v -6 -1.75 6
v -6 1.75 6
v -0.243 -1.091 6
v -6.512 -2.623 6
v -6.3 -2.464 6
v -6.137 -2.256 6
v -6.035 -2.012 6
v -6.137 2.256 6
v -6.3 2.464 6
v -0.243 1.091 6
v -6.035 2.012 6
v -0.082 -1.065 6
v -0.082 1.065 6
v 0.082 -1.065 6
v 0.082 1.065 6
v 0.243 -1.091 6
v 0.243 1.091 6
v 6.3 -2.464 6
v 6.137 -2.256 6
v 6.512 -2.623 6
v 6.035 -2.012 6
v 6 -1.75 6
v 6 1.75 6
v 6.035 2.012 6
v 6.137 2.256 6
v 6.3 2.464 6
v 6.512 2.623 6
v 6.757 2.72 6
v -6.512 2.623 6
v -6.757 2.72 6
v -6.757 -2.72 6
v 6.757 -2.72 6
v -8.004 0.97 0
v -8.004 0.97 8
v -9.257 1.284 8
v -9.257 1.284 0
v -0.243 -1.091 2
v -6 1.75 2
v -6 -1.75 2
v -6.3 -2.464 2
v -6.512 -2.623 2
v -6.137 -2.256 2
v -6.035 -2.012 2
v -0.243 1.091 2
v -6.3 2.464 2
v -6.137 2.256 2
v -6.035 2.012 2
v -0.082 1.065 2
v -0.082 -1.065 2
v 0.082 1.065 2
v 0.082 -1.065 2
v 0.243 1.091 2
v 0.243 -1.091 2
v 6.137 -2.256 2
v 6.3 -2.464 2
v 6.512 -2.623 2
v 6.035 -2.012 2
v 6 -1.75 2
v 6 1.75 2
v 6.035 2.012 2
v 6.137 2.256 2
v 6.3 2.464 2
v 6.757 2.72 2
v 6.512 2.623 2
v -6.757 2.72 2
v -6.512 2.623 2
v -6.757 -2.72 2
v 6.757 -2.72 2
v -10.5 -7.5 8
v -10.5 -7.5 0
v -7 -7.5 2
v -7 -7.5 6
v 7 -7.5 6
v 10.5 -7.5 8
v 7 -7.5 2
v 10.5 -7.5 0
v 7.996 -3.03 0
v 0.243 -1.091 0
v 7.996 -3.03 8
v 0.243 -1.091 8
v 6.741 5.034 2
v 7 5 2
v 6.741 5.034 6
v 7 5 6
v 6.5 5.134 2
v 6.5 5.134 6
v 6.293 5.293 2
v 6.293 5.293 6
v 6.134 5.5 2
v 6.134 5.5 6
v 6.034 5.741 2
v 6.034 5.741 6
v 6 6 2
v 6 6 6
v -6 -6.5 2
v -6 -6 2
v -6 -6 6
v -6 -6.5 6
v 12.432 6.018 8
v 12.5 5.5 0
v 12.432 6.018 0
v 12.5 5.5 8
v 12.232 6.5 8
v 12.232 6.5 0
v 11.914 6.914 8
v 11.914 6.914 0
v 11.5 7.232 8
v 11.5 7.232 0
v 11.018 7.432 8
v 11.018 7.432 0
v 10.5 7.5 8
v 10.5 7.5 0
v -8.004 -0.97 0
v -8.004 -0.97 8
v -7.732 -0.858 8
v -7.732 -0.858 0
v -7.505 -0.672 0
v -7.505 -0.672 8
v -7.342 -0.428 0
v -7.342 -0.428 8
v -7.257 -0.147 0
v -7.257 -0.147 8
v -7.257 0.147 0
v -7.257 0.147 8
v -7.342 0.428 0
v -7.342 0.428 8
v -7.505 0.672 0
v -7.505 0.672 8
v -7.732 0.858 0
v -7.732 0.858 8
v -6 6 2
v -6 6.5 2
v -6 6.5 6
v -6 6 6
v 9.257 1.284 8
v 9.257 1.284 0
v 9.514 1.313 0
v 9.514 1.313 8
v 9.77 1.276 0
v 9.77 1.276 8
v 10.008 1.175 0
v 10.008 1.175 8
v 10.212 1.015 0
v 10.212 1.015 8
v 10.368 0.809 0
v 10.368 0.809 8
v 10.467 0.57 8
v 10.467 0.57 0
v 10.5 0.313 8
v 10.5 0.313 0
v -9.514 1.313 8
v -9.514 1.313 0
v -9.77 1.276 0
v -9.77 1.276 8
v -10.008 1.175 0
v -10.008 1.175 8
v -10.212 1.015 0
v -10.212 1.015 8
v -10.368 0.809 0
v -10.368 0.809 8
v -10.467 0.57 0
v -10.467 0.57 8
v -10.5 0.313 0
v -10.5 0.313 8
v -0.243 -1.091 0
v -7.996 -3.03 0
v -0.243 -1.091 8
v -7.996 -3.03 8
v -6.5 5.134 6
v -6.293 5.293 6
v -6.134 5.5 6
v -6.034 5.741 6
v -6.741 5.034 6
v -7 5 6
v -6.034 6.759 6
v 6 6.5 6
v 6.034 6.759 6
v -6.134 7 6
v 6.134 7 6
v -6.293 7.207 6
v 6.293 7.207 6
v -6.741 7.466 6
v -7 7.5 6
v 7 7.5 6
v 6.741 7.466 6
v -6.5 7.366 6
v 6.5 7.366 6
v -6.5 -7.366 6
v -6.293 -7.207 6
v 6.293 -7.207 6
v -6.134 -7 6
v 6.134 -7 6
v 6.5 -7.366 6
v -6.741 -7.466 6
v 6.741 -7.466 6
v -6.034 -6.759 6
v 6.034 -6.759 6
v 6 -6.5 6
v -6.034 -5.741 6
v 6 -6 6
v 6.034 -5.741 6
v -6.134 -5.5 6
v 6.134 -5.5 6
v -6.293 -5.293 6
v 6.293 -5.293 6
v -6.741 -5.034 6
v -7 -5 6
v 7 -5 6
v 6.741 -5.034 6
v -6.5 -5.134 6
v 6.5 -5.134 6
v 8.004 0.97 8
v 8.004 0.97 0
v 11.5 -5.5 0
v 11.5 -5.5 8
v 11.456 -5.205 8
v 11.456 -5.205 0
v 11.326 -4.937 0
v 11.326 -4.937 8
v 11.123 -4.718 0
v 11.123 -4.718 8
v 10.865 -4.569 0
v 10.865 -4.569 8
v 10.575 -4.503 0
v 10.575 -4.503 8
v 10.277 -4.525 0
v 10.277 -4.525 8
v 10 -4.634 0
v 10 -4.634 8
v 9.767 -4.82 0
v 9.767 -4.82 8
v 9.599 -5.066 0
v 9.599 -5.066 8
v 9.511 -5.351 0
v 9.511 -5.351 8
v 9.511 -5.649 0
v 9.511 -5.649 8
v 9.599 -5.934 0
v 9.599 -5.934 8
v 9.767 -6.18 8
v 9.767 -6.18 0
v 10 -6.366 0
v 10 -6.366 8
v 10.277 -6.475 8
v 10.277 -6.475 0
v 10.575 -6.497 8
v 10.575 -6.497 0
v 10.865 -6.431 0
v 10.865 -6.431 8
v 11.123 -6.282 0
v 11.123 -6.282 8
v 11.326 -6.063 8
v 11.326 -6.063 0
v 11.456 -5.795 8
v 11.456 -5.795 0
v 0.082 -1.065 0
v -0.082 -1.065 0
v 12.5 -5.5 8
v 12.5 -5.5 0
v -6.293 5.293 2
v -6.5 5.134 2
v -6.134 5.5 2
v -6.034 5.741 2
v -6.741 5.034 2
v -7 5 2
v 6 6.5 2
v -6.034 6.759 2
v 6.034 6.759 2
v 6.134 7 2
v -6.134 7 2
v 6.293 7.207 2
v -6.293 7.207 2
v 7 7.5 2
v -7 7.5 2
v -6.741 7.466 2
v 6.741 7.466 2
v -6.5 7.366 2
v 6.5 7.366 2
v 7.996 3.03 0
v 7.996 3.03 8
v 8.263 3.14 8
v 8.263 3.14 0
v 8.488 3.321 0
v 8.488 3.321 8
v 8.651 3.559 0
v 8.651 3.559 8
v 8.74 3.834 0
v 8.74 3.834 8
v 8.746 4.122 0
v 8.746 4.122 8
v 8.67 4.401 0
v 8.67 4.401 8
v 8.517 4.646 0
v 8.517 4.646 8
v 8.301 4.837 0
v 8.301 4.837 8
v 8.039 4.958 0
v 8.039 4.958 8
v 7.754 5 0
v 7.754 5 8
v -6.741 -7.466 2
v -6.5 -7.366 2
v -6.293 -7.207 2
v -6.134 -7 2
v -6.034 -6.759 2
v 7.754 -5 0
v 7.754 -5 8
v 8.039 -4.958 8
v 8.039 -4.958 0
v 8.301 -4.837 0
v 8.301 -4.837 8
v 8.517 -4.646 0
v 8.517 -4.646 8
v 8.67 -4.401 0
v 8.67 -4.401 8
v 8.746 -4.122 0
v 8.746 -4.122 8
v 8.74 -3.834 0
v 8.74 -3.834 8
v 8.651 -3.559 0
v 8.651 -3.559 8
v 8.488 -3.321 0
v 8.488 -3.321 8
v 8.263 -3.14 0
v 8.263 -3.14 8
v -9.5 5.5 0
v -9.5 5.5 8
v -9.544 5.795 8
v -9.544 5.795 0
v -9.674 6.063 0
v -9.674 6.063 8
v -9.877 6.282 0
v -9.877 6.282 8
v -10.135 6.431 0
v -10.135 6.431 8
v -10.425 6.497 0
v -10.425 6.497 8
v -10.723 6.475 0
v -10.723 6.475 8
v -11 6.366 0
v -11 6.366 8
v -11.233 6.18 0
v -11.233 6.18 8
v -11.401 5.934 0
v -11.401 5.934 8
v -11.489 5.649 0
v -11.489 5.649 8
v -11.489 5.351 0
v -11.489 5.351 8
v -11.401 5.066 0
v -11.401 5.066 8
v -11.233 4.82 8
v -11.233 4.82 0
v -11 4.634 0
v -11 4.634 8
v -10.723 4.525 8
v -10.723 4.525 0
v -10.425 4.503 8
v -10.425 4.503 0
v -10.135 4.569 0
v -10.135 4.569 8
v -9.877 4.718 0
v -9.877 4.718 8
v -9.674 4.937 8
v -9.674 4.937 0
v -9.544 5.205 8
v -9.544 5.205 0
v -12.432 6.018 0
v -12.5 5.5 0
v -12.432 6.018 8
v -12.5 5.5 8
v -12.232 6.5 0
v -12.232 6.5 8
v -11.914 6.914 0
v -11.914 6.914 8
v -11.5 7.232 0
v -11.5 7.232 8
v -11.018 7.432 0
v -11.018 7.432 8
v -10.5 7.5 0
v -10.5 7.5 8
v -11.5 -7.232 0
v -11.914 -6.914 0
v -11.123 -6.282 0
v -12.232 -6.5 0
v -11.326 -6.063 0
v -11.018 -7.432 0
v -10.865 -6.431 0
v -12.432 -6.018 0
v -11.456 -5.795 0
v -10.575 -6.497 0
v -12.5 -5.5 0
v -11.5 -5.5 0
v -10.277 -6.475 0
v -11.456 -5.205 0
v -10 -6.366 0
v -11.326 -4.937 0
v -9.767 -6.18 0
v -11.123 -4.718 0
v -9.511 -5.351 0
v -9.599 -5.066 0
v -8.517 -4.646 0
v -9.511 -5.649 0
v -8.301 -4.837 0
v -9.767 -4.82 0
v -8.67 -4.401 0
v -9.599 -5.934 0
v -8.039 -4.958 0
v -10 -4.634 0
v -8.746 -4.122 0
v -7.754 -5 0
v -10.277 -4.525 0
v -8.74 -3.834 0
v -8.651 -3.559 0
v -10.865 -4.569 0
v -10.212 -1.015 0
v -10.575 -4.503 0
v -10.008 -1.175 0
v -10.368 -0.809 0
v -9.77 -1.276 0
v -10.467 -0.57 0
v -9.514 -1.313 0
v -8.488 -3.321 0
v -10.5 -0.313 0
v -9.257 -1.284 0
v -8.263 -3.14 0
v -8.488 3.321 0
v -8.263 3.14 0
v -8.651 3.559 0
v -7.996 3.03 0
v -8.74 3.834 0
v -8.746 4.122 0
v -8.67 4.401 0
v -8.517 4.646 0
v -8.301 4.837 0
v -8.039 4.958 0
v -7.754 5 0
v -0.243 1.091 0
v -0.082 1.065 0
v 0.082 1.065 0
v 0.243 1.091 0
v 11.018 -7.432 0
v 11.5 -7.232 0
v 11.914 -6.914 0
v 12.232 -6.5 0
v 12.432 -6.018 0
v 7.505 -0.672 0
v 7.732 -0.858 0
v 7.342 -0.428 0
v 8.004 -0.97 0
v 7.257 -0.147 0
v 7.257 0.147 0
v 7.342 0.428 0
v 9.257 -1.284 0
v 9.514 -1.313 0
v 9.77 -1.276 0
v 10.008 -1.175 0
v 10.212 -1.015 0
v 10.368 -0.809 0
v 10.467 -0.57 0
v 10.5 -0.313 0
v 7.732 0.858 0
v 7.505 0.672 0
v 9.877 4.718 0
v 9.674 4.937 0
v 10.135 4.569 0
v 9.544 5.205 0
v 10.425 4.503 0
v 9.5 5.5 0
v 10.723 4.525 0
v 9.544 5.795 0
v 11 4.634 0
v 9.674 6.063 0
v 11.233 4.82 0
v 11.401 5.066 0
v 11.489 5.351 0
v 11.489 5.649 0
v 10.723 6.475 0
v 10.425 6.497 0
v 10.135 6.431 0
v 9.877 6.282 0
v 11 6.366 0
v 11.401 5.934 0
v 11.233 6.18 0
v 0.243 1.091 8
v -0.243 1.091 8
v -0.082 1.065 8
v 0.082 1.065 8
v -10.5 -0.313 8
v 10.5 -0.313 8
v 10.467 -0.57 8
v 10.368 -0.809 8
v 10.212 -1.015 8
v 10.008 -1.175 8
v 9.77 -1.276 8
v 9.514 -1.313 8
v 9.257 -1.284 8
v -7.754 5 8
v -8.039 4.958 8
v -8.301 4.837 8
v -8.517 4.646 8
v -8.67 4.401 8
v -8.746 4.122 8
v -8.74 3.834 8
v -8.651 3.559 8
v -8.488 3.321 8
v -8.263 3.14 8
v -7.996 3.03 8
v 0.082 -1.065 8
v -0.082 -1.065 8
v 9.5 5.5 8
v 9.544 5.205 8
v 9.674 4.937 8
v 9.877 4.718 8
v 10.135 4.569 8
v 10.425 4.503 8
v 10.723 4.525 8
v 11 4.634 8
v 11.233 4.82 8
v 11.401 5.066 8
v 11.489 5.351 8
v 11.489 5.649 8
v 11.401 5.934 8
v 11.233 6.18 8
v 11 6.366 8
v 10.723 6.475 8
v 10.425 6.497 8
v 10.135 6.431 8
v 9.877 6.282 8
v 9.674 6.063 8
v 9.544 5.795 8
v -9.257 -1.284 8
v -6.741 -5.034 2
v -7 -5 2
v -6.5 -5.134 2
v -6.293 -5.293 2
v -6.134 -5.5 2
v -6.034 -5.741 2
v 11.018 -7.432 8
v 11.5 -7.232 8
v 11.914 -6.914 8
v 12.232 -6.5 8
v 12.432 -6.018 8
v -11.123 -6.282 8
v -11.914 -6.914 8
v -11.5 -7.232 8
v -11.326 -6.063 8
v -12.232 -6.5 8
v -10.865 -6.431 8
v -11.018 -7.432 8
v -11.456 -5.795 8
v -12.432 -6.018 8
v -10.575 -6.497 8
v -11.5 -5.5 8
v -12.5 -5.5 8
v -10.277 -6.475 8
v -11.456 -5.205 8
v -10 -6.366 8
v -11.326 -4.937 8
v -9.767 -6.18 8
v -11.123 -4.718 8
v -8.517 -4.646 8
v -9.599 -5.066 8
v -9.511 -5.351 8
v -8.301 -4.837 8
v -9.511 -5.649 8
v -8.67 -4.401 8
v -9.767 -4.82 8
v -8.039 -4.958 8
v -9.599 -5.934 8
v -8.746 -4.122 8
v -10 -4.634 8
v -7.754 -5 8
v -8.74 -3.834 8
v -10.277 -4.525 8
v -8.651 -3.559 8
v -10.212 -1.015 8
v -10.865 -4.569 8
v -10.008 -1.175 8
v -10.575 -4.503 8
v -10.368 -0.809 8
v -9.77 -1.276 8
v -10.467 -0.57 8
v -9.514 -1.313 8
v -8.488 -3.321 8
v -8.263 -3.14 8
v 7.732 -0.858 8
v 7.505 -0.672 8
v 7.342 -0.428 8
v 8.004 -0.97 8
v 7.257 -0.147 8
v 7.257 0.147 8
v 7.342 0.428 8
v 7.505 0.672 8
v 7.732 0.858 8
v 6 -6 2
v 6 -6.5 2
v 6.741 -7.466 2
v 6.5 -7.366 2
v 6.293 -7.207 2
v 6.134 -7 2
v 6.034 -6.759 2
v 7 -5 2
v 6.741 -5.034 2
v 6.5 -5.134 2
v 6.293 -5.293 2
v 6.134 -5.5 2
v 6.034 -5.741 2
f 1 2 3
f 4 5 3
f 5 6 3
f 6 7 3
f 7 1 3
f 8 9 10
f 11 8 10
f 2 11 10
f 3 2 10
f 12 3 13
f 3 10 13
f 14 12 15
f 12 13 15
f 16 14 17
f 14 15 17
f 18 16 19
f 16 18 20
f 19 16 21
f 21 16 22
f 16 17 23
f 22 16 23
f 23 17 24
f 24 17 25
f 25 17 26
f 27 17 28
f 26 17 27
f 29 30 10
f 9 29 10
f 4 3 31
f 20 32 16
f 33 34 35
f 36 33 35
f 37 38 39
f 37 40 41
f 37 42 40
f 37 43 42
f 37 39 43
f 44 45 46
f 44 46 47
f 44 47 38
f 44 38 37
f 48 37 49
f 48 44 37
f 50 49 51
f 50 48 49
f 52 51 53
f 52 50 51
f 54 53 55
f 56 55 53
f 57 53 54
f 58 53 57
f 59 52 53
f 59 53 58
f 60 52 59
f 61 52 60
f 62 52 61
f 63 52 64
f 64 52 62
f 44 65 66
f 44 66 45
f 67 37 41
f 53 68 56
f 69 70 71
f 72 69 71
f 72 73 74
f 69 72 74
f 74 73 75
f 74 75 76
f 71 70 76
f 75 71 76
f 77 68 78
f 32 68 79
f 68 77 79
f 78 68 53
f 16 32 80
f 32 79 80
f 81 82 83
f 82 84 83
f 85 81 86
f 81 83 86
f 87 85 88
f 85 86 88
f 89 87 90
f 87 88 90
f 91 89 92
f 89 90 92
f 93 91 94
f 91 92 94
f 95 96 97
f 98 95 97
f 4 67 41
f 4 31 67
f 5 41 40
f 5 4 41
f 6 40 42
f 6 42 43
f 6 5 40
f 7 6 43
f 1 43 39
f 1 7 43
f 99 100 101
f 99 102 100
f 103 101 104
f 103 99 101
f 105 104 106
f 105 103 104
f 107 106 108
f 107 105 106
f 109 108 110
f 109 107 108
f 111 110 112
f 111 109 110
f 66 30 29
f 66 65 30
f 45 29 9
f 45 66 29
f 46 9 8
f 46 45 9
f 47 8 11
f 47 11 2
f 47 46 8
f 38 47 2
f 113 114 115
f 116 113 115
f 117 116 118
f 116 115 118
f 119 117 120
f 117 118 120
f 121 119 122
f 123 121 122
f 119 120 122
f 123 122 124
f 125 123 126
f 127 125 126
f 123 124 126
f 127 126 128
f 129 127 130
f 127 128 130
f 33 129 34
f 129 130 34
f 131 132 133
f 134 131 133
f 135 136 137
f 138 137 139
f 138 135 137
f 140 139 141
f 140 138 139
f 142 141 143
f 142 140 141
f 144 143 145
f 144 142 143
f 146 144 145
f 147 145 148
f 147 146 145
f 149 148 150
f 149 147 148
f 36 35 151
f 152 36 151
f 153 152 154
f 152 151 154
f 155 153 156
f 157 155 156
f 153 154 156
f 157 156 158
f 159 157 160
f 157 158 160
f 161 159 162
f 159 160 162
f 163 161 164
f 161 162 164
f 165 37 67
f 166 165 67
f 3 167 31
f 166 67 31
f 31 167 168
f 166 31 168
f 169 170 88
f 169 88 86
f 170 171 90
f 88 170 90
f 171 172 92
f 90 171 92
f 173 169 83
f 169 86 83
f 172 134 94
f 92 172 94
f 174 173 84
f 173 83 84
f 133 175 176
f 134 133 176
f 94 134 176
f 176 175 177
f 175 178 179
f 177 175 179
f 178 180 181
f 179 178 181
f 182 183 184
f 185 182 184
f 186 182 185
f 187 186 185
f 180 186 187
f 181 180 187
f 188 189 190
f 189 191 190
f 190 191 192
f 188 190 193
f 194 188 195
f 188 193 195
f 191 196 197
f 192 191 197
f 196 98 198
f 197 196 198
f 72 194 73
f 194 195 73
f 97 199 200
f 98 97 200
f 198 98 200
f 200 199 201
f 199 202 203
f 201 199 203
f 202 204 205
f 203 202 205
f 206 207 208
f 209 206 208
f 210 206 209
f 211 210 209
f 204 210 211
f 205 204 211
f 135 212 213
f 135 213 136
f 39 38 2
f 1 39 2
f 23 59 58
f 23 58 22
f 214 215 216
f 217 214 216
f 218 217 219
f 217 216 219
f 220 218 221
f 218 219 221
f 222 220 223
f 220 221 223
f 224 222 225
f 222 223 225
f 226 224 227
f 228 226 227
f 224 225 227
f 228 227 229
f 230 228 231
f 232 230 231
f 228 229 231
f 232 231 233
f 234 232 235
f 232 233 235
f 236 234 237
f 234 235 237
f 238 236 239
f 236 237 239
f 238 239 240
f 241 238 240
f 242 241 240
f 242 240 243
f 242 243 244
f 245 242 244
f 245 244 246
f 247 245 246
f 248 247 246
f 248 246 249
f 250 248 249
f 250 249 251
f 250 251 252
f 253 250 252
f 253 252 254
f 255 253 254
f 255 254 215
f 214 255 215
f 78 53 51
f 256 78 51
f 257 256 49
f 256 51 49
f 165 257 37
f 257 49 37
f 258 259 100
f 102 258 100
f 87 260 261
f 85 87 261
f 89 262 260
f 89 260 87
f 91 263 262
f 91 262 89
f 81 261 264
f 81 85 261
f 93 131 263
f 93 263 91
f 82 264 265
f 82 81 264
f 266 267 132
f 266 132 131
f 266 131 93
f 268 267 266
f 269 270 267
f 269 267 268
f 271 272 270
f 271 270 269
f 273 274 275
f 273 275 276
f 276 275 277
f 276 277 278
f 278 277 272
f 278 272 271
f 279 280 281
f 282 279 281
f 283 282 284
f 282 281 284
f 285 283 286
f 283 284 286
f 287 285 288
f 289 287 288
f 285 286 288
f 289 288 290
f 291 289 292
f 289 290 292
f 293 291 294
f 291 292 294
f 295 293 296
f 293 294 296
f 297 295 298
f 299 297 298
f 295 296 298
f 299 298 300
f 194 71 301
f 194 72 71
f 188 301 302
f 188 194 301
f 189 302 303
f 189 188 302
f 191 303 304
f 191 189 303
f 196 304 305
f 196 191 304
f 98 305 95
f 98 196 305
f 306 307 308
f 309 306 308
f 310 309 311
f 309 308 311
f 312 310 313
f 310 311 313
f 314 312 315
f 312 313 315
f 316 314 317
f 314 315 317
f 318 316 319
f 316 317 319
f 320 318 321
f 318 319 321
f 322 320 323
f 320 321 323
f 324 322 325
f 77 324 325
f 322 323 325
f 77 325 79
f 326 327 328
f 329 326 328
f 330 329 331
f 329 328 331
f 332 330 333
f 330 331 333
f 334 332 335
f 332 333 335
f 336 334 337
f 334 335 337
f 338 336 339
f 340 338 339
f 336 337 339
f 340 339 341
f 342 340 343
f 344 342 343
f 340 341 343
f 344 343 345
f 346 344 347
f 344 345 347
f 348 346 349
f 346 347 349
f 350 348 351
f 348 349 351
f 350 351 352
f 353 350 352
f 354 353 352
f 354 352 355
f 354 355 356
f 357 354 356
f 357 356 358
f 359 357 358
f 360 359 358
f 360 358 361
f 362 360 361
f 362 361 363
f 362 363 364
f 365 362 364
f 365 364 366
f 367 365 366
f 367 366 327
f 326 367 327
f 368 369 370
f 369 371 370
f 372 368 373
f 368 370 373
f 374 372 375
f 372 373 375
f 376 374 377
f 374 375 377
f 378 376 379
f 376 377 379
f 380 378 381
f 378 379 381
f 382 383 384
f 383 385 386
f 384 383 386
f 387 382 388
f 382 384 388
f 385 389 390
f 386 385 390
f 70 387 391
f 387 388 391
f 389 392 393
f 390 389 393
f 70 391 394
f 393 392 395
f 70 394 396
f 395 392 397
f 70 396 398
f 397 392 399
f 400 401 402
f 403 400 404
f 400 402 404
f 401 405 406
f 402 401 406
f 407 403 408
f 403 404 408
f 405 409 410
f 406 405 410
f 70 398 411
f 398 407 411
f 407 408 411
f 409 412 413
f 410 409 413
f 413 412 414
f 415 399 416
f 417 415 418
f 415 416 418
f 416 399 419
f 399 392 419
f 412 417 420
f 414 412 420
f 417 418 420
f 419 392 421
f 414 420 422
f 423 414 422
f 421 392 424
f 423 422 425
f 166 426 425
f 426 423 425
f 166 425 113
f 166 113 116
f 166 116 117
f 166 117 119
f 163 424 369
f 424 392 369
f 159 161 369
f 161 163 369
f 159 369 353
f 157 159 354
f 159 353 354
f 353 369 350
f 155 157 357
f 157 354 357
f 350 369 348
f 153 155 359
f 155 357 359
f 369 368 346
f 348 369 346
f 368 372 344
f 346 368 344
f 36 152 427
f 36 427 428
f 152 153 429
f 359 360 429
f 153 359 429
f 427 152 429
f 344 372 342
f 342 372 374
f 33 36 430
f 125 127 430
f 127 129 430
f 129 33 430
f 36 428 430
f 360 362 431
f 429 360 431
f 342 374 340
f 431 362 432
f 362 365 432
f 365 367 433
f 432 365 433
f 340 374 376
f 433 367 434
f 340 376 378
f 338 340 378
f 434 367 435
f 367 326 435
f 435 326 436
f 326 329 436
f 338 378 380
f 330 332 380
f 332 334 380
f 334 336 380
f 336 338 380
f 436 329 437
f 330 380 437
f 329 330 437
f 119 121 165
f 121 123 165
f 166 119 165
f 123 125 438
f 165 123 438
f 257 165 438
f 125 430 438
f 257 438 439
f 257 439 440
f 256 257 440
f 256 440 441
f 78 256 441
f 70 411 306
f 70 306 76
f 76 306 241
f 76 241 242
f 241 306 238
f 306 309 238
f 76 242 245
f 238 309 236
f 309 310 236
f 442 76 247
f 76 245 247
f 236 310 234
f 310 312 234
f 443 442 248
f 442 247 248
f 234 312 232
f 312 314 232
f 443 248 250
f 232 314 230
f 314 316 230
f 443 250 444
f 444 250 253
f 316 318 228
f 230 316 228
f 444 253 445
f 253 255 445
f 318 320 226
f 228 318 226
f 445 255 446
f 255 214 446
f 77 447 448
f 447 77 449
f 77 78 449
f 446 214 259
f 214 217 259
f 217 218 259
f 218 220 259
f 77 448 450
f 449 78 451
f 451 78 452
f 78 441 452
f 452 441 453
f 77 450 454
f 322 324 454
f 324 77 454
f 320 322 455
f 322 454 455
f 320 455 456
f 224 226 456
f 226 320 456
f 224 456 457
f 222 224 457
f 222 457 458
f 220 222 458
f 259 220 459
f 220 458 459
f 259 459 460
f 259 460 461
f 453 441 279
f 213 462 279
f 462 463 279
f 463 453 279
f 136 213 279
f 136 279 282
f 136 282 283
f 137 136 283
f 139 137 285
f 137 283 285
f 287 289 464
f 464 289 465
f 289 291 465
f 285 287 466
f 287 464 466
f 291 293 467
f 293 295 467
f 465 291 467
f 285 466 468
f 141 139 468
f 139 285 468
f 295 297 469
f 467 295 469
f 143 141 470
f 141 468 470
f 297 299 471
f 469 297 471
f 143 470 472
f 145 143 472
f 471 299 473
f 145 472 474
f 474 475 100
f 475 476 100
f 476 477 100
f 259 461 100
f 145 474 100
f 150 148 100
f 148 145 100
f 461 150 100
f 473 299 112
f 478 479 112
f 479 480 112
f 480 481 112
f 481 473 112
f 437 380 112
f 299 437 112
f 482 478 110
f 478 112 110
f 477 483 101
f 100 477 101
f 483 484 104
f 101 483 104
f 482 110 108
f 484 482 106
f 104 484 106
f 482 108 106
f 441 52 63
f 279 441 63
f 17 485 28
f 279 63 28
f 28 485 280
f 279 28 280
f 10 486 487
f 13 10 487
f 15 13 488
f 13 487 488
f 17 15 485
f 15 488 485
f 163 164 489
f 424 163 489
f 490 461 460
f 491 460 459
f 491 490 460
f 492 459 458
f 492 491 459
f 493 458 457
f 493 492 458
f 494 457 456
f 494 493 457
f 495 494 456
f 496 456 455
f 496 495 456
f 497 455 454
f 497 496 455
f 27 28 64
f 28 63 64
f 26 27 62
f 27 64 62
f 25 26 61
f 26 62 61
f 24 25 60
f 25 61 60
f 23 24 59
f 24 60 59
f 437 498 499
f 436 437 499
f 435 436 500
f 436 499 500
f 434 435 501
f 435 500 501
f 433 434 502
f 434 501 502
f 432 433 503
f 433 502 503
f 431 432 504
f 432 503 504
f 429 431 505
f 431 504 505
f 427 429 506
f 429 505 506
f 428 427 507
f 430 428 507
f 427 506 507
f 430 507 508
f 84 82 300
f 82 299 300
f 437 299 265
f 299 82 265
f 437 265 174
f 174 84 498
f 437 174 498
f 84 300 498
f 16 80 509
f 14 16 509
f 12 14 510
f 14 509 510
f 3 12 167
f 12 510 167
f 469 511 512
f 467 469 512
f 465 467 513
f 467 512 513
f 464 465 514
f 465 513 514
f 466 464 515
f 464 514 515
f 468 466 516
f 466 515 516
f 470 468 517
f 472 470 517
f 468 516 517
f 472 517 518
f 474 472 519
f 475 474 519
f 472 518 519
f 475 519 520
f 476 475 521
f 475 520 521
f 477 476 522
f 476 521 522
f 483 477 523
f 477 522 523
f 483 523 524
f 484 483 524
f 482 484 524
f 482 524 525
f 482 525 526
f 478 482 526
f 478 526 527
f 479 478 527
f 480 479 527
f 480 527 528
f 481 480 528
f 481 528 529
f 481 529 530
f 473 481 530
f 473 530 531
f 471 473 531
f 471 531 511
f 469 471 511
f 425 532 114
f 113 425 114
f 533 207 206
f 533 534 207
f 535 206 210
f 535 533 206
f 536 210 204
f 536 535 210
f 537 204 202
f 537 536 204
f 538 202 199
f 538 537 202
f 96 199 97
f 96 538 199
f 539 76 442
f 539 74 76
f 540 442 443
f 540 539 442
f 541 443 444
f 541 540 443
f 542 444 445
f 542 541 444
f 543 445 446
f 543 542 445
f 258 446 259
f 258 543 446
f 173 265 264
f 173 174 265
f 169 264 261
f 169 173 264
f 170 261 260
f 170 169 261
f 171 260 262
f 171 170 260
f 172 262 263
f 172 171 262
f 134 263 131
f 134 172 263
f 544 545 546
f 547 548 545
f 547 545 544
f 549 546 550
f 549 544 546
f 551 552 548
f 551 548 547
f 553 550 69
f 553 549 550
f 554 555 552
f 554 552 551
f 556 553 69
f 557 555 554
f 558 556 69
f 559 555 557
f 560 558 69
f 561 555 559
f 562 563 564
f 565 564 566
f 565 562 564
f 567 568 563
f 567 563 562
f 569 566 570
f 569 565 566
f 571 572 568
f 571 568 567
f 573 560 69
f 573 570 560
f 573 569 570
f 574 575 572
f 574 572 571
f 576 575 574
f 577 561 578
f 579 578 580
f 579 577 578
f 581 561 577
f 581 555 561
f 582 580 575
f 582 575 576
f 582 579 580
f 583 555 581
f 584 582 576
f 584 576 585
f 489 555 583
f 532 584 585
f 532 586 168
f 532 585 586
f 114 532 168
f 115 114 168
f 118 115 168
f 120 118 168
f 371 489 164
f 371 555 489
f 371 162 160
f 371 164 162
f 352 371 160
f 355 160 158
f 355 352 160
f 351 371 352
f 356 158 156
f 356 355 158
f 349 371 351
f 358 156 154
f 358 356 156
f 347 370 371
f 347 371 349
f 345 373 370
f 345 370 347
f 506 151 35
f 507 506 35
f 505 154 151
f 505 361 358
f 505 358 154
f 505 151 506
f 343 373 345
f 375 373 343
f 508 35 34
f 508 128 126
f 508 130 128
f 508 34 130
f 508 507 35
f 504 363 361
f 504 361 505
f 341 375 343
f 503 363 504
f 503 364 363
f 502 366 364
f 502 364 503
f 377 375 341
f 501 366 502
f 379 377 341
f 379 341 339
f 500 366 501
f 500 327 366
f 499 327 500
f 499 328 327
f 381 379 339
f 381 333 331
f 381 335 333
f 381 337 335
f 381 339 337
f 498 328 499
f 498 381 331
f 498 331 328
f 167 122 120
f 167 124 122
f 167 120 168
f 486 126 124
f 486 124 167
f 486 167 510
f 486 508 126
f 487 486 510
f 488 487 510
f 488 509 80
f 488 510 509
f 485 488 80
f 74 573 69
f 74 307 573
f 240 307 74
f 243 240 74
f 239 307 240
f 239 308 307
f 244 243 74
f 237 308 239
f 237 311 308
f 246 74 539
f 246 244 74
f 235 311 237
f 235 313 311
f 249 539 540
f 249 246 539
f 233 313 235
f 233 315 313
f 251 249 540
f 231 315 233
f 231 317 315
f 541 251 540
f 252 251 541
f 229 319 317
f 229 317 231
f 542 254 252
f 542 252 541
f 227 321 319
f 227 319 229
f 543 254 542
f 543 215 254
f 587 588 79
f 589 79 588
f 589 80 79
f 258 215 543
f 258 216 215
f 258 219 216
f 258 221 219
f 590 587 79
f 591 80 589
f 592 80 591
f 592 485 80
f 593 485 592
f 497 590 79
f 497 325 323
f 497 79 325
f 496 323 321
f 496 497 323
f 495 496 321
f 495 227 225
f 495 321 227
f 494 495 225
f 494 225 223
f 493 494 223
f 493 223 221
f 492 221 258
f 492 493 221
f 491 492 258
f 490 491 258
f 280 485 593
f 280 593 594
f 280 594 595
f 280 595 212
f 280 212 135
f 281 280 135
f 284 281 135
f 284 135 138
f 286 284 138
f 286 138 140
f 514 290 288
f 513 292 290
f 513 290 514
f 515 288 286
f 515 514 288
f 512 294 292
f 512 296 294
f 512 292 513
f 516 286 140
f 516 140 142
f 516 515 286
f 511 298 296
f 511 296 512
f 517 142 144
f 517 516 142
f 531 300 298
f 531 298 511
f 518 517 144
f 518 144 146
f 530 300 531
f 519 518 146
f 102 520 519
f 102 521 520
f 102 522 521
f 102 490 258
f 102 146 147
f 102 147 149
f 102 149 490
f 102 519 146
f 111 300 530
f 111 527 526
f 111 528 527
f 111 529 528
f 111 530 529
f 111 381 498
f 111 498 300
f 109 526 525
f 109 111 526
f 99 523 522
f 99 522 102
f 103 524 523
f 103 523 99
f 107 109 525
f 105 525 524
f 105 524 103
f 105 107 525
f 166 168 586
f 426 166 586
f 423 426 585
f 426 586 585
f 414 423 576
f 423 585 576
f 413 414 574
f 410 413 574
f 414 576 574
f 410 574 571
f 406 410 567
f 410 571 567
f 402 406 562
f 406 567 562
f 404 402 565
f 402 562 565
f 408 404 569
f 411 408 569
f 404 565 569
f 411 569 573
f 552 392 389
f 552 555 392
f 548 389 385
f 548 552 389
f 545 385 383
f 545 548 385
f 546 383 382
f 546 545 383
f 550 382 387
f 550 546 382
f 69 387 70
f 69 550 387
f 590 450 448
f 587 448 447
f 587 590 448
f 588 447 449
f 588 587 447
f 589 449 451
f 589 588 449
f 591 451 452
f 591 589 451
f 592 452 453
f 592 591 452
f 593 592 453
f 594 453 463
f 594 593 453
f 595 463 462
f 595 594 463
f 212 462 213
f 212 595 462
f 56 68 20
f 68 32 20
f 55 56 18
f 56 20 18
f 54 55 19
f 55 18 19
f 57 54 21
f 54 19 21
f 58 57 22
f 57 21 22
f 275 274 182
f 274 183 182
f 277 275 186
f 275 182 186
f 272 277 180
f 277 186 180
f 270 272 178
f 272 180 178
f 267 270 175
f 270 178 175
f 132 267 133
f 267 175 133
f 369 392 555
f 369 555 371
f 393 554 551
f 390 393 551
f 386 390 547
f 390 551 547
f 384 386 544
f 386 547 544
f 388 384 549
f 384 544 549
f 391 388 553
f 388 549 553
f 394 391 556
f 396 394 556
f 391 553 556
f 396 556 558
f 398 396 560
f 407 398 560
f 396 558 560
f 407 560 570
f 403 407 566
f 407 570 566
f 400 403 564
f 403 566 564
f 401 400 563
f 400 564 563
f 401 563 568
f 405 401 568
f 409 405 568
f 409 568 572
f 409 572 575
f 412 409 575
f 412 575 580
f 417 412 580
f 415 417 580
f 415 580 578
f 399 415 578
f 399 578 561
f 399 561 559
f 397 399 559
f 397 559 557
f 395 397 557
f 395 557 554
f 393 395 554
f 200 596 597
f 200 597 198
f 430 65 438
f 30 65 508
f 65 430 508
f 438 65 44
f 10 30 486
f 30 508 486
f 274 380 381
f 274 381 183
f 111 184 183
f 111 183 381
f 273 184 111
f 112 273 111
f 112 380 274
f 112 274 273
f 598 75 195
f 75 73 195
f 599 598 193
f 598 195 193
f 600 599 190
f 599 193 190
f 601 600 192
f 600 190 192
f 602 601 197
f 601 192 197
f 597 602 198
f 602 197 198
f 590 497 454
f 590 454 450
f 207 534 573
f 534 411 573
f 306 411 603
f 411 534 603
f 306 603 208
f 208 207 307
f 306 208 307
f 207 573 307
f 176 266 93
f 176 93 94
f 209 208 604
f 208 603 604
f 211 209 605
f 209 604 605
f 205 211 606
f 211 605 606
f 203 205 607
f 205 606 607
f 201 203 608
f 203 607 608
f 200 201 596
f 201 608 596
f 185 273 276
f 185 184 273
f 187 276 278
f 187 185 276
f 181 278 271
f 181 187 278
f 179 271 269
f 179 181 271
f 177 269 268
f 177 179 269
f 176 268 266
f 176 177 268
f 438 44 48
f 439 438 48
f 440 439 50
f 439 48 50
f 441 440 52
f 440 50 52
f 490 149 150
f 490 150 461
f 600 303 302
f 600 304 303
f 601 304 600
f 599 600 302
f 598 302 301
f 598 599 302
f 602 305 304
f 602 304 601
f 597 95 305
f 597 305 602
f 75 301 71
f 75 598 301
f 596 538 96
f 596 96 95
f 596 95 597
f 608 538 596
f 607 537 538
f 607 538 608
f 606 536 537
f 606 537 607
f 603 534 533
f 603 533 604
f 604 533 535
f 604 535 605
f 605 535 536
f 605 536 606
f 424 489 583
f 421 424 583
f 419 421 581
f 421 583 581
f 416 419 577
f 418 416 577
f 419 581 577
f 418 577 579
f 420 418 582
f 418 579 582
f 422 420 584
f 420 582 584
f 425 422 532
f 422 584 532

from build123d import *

# Parameters (mm, degrees)
SKETCH_1_W               = 25
SKETCH_1_H               = 15
EXTRUDE_1_DEPTH          = 8
FILLET_4_R               = 2
CUT_EXTRUDE_3_DEPTH      = 10
SKETCH_3_R               = 1
CUT_EXTRUDE_4_DEPTH      = 10
CUT_EXTRUDE_5_DEPTH      = 22.100947846
CUT_EXTRUDE_5_DEPTH_BACK = 22.100947846
SKETCH_4_W               = 12
SKETCH_4_H               = 4
FILLET_6_R               = 1


with BuildPart() as part:
    # 草图1 → 凸台-拉伸1 (new body)
    with BuildSketch(Plane.XY):
        Rectangle(SKETCH_1_W, SKETCH_1_H)
    extrude(amount=EXTRUDE_1_DEPTH)

    # 圆角4
    fillet_4_edges = [part.edges().sort_by_distance(p)[0] for p in [
        (12.5, -7.5, 4),
        (-12.5, -7.5, 4),
        (-12.5, 7.5, 4),
        (12.5, 7.5, 4),
    ]]
    fillet(fillet_4_edges, radius=FILLET_4_R)

    # 草图2 → 切除-拉伸3 (cut)
    with BuildSketch(Plane.XY.offset(8)):
        with BuildLine():
            Line((-0.242535625, -1.091410313), (-7.996324374, -3.0298575))
            ThreePointArc((-7.996324374, -3.0298575), (-8.746296305, -4.122183264), (-7.753788749, -5))
            Line((-7.753788749, -5), (7.753788749, -5))
            ThreePointArc((7.753788749, -5), (8.746296305, -4.122183264), (7.996324374, -3.0298575))
            Line((7.996324374, -3.0298575), (0.242535625, -1.091410313))
            ThreePointArc((0.242535625, -1.091410313), (0, -1.061552813), (-0.242535625, -1.091410313))
        make_face()
        with BuildLine():
            Line((7.753788749, 5), (-7.753788749, 5))
            ThreePointArc((-7.753788749, 5), (-8.746296305, 4.122183264), (-7.996324374, 3.0298575))
            Line((-7.996324374, 3.0298575), (-0.242535625, 1.091410313))
            ThreePointArc((-0.242535625, 1.091410313), (0, 1.061552813), (0.242535625, 1.091410313))
            Line((0.242535625, 1.091410313), (7.996324374, 3.0298575))
            ThreePointArc((7.996324374, 3.0298575), (8.746296305, 4.122183264), (7.753788749, 5))
        make_face()
        with BuildLine():
            Line((-9.257464375, -1.283589687), (-8.003675626, -0.9701425))
            ThreePointArc((-8.003675626, -0.9701425), (-7.246211251, 0), (-8.003675626, 0.9701425))
            Line((-8.003675626, 0.9701425), (-9.257464375, 1.283589687))
            ThreePointArc((-9.257464375, 1.283589687), (-10.115412209, 1.101652625), (-10.5, 0.313447187))
            Line((-10.5, 0.313447187), (-10.5, -0.313447187))
            ThreePointArc((-10.5, -0.313447187), (-10.115412209, -1.101652625), (-9.257464375, -1.283589687))
        make_face()
        with BuildLine():
            Line((10.5, 0.313447187), (10.5, -0.313447187))
            ThreePointArc((10.5, -0.313447187), (10.115412209, -1.101652625), (9.257464375, -1.283589687))
            Line((9.257464375, -1.283589687), (8.003675626, -0.9701425))
            ThreePointArc((8.003675626, -0.9701425), (7.246211251, 0), (8.003675626, 0.9701425))
            Line((8.003675626, 0.9701425), (9.257464375, 1.283589687))
            ThreePointArc((9.257464375, 1.283589687), (10.115412209, 1.101652625), (10.5, 0.313447187))
        make_face()
    extrude(amount=-CUT_EXTRUDE_3_DEPTH, mode=Mode.SUBTRACT)

    # 草图3 → 切除-拉伸4 (cut)
    with BuildSketch(Plane.XY.offset(8)):
        with Locations((-10.5, 5.5)):
            Circle(SKETCH_3_R)
        with Locations(Location((10.5, 5.5, 0), (0, 0, 180))):
            Circle(SKETCH_3_R)
        with Locations((10.5, -5.5)):
            Circle(SKETCH_3_R)
        with Locations(Location((-10.5, -5.5, 0), (0, 0, 180))):
            Circle(SKETCH_3_R)
    extrude(amount=-CUT_EXTRUDE_4_DEPTH, mode=Mode.SUBTRACT)

    # 草图4 → 切除-拉伸5 (cut, two sides: drawn at the far end of the back side and taken through both)
    with BuildSketch(Plane.XZ.offset(7.5).offset(-CUT_EXTRUDE_5_DEPTH_BACK)):
        with Locations((0, 4)):
            Rectangle(SKETCH_4_W, SKETCH_4_H)
    extrude(amount=CUT_EXTRUDE_5_DEPTH + CUT_EXTRUDE_5_DEPTH_BACK, mode=Mode.SUBTRACT)

    # 圆角6
    fillet_6_edges = [part.edges().sort_by_distance(p)[0] for p in [
        (6, 2.530776406, 4),
        (-6, 5, 4),
        (-6, -7.5, 4),
        (-6, -5, 4),
        (-6, -2.530776406, 4),
        (-6, 2.530776406, 4),
        (-6, 7.5, 4),
        (6, -7.5, 4),
        (6, -5, 4),
        (6, -2.530776406, 4),
        (6, 5, 4),
        (6, 7.5, 4),
    ]]
    fillet(fillet_6_edges, radius=FILLET_6_R)


solid = part.part
